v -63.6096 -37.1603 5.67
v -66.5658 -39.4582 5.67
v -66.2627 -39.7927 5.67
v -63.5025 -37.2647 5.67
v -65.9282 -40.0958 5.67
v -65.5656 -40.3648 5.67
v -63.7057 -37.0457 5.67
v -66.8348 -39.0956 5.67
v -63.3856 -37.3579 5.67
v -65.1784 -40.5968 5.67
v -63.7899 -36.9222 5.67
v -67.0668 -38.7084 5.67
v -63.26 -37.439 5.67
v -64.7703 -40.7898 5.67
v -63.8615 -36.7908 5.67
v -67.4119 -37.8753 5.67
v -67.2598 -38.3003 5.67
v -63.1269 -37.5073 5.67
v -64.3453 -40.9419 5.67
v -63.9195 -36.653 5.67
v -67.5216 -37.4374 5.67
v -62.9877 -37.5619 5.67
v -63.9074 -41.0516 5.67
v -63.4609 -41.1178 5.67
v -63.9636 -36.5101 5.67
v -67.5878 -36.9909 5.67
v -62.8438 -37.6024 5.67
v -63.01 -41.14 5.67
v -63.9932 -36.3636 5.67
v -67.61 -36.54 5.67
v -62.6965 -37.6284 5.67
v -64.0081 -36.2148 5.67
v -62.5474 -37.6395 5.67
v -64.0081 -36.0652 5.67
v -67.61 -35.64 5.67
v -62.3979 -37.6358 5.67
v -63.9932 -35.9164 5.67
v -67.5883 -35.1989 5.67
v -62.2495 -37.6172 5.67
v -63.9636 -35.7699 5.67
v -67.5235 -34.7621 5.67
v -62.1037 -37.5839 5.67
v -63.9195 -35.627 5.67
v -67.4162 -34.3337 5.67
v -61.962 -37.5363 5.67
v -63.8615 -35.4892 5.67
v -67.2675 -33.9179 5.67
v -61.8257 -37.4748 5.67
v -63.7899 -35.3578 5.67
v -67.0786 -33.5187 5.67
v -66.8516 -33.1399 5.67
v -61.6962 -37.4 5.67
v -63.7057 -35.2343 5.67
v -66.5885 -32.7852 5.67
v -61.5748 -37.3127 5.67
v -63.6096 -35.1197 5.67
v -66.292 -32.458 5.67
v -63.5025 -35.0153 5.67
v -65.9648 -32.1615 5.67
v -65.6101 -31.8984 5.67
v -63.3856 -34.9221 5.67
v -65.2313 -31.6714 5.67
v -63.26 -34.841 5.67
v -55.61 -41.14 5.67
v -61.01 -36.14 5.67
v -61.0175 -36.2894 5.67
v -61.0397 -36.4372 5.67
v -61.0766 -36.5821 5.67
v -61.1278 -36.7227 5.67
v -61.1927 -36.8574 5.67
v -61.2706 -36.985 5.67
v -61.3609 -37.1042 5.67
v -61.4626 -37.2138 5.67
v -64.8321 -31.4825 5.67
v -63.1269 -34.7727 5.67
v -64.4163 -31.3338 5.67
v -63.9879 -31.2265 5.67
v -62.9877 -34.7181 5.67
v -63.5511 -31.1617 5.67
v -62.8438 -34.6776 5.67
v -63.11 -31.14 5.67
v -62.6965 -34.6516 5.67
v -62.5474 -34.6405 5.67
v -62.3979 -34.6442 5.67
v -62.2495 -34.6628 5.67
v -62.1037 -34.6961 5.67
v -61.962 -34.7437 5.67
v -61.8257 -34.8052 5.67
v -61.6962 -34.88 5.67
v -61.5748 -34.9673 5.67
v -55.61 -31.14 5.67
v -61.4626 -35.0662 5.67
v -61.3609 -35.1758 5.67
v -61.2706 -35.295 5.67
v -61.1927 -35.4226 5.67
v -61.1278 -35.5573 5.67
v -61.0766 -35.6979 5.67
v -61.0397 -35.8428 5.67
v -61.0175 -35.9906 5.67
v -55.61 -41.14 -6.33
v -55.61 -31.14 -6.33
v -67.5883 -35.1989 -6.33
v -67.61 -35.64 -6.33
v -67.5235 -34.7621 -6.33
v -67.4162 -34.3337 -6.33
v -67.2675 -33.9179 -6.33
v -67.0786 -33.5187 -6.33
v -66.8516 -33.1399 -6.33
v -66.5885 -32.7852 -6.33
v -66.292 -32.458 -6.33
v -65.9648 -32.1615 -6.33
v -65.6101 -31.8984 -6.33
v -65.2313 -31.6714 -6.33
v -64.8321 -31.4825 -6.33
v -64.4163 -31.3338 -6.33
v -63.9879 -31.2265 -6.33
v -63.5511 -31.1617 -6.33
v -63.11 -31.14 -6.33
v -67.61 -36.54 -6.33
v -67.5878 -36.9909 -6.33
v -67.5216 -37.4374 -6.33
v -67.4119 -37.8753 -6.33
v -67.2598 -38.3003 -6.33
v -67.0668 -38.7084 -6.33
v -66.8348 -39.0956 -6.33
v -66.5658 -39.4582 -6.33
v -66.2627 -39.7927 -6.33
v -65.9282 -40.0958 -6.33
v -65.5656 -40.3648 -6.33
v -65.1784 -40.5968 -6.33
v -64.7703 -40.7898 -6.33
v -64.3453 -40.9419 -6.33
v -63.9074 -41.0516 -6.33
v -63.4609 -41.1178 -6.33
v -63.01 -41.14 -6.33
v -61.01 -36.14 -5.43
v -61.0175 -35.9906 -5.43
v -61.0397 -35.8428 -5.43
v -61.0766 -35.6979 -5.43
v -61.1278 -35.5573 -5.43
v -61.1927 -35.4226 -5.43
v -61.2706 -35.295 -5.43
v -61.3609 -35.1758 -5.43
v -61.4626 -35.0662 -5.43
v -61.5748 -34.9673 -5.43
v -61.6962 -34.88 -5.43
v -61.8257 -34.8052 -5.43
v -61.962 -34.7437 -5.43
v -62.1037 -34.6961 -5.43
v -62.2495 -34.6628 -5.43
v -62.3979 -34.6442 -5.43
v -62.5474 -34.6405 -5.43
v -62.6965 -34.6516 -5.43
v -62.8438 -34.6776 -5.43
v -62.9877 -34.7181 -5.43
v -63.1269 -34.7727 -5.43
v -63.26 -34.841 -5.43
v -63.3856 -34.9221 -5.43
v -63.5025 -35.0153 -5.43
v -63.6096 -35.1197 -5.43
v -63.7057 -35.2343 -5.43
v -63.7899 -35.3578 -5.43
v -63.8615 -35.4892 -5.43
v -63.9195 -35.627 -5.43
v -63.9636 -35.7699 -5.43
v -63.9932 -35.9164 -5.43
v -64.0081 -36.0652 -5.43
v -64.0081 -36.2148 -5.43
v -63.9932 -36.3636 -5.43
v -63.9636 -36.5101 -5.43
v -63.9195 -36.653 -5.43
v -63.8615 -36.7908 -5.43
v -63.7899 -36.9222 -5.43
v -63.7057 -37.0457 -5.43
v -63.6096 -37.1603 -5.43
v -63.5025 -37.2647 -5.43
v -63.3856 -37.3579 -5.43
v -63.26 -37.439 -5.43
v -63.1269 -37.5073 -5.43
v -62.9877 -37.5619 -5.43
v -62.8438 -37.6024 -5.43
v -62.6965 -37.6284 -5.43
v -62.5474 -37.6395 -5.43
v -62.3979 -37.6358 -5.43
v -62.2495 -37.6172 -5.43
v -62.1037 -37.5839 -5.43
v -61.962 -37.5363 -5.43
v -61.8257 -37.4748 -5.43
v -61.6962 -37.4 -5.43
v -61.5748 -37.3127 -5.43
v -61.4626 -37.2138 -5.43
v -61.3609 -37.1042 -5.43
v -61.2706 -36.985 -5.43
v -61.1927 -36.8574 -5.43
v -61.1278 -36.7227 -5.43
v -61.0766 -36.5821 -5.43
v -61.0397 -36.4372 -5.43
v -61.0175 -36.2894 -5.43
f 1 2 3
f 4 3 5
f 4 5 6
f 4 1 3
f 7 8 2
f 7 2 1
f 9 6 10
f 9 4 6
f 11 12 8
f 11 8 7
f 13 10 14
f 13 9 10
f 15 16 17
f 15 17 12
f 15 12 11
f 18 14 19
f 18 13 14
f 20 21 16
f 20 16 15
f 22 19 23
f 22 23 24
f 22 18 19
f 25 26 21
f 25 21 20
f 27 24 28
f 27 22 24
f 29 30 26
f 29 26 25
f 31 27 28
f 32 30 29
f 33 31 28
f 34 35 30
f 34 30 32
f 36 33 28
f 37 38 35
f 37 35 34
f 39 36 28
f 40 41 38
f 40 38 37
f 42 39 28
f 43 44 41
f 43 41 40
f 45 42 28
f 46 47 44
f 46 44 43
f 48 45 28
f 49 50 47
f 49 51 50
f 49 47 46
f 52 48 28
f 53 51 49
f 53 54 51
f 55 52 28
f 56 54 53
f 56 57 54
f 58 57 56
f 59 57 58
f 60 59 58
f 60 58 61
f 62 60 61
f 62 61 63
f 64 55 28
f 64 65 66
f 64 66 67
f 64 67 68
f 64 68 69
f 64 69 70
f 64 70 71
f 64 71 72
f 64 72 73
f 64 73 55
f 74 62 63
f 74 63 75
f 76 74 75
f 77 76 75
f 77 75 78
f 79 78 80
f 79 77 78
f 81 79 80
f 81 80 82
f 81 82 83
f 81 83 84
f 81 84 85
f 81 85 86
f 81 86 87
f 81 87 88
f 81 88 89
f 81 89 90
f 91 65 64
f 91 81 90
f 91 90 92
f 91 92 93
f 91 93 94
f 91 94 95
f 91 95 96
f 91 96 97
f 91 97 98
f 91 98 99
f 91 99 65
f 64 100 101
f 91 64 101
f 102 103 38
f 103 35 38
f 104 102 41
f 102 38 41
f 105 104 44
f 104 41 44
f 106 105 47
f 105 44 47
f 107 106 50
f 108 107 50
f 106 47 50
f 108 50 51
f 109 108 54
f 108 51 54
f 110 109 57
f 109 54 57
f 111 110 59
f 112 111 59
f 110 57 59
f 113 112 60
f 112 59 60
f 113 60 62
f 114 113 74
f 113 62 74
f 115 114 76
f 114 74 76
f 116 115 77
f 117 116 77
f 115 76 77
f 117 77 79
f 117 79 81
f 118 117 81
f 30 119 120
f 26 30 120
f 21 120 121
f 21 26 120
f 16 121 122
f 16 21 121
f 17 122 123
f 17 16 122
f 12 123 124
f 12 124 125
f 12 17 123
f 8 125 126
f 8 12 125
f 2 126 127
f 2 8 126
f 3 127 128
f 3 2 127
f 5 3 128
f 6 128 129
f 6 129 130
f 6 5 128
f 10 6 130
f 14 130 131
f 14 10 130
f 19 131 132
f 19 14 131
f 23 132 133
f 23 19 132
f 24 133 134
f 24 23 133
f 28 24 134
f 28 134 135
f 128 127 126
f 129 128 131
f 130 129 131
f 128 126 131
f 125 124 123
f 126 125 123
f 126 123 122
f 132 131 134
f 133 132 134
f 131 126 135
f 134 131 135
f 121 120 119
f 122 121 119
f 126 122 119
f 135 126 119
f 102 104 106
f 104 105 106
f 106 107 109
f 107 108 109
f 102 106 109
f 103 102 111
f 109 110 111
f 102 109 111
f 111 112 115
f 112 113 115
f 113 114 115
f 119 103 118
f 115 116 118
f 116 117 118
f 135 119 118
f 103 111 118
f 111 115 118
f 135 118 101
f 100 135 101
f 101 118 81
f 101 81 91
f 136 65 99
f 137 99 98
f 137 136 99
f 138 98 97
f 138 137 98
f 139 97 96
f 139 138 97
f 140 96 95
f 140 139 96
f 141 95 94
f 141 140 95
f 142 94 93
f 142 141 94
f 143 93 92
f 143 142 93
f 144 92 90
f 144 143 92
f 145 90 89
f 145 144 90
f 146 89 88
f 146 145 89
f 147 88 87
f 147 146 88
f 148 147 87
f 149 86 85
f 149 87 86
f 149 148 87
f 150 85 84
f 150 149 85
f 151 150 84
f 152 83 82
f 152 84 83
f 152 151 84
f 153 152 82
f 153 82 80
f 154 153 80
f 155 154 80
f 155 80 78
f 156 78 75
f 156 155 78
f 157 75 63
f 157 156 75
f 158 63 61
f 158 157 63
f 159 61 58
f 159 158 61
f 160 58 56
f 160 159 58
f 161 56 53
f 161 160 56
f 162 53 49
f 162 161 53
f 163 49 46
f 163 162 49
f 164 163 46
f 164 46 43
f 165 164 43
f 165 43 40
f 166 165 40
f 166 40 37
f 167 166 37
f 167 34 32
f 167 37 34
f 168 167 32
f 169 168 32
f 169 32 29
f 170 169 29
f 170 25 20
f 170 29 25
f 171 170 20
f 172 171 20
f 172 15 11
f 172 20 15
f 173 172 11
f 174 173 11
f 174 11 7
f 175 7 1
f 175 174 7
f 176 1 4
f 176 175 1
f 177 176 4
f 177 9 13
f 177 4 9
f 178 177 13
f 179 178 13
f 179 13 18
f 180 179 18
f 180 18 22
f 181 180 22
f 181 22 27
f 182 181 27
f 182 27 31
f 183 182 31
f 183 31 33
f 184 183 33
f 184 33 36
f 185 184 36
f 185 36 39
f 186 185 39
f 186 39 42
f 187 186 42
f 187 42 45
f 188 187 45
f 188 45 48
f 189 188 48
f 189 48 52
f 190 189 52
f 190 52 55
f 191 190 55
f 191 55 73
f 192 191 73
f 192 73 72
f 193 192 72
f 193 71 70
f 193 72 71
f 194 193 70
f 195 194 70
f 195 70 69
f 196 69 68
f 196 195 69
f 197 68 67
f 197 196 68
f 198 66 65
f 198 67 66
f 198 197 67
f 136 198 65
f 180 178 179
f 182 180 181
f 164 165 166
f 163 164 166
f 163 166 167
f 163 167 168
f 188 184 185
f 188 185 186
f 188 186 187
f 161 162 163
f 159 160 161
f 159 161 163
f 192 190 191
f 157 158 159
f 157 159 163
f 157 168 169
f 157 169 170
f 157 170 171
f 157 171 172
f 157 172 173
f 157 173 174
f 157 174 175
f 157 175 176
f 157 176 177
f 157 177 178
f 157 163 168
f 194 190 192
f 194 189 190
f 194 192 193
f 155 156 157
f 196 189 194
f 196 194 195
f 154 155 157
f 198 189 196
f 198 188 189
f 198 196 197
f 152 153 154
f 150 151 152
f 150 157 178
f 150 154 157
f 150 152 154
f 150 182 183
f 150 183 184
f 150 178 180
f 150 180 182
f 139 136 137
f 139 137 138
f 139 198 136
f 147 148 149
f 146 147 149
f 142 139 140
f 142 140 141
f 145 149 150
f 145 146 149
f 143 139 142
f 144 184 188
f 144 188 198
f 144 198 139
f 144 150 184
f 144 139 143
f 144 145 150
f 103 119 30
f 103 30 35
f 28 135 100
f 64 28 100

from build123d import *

# Parameters (mm, degrees)
CYLINDER002_R     = 1.5
CYLINDER002_DEPTH = 20
BOX033_W          = 12
BOX033_H          = 10
BOX033_DEPTH      = 12
FILLET011_R       = 4.5
FILLET012_R       = 4.6


with BuildPart() as cylinder:
    # Cylinder002 → Cylinder002 (new body)
    with BuildSketch(Plane(origin=(-103.2, 5, -48.3), x_dir=(1, 0, 0), z_dir=(0, 0, 1))):
        Circle(CYLINDER002_R)
    extrude(amount=CYLINDER002_DEPTH)


with BuildPart() as fillet012:
    # Box033 → Box033 (new body)
    with BuildSketch(Plane(origin=(-108.3, 0, -49.2), x_dir=(1, 0, 0), z_dir=(0, 0, 1))):
        with Locations((6, 5)):
            Rectangle(BOX033_W, BOX033_H)
    extrude(amount=BOX033_DEPTH)

    # Cut017: cut Cylinder
    add(cylinder.part, mode=Mode.SUBTRACT)

    # Fillet011
    fillet011_edges = [fillet012.edges().sort_by_distance(p)[0] for p in [
        (-108.3, 10, -43.2),
    ]]
    fillet(fillet011_edges, radius=FILLET011_R)

    # Fillet012
    fillet012_edges = [fillet012.edges().sort_by_distance(p)[0] for p in [
        (-108.3, 0, -43.2),
    ]]
    fillet(fillet012_edges, radius=FILLET012_R)


with BuildPart() as fillet012_1:
    # Fillet012 placement: moved
    add(fillet012.part.moved(Location((40.69, -41.14, 42.87))))


solid = fillet012_1.part
